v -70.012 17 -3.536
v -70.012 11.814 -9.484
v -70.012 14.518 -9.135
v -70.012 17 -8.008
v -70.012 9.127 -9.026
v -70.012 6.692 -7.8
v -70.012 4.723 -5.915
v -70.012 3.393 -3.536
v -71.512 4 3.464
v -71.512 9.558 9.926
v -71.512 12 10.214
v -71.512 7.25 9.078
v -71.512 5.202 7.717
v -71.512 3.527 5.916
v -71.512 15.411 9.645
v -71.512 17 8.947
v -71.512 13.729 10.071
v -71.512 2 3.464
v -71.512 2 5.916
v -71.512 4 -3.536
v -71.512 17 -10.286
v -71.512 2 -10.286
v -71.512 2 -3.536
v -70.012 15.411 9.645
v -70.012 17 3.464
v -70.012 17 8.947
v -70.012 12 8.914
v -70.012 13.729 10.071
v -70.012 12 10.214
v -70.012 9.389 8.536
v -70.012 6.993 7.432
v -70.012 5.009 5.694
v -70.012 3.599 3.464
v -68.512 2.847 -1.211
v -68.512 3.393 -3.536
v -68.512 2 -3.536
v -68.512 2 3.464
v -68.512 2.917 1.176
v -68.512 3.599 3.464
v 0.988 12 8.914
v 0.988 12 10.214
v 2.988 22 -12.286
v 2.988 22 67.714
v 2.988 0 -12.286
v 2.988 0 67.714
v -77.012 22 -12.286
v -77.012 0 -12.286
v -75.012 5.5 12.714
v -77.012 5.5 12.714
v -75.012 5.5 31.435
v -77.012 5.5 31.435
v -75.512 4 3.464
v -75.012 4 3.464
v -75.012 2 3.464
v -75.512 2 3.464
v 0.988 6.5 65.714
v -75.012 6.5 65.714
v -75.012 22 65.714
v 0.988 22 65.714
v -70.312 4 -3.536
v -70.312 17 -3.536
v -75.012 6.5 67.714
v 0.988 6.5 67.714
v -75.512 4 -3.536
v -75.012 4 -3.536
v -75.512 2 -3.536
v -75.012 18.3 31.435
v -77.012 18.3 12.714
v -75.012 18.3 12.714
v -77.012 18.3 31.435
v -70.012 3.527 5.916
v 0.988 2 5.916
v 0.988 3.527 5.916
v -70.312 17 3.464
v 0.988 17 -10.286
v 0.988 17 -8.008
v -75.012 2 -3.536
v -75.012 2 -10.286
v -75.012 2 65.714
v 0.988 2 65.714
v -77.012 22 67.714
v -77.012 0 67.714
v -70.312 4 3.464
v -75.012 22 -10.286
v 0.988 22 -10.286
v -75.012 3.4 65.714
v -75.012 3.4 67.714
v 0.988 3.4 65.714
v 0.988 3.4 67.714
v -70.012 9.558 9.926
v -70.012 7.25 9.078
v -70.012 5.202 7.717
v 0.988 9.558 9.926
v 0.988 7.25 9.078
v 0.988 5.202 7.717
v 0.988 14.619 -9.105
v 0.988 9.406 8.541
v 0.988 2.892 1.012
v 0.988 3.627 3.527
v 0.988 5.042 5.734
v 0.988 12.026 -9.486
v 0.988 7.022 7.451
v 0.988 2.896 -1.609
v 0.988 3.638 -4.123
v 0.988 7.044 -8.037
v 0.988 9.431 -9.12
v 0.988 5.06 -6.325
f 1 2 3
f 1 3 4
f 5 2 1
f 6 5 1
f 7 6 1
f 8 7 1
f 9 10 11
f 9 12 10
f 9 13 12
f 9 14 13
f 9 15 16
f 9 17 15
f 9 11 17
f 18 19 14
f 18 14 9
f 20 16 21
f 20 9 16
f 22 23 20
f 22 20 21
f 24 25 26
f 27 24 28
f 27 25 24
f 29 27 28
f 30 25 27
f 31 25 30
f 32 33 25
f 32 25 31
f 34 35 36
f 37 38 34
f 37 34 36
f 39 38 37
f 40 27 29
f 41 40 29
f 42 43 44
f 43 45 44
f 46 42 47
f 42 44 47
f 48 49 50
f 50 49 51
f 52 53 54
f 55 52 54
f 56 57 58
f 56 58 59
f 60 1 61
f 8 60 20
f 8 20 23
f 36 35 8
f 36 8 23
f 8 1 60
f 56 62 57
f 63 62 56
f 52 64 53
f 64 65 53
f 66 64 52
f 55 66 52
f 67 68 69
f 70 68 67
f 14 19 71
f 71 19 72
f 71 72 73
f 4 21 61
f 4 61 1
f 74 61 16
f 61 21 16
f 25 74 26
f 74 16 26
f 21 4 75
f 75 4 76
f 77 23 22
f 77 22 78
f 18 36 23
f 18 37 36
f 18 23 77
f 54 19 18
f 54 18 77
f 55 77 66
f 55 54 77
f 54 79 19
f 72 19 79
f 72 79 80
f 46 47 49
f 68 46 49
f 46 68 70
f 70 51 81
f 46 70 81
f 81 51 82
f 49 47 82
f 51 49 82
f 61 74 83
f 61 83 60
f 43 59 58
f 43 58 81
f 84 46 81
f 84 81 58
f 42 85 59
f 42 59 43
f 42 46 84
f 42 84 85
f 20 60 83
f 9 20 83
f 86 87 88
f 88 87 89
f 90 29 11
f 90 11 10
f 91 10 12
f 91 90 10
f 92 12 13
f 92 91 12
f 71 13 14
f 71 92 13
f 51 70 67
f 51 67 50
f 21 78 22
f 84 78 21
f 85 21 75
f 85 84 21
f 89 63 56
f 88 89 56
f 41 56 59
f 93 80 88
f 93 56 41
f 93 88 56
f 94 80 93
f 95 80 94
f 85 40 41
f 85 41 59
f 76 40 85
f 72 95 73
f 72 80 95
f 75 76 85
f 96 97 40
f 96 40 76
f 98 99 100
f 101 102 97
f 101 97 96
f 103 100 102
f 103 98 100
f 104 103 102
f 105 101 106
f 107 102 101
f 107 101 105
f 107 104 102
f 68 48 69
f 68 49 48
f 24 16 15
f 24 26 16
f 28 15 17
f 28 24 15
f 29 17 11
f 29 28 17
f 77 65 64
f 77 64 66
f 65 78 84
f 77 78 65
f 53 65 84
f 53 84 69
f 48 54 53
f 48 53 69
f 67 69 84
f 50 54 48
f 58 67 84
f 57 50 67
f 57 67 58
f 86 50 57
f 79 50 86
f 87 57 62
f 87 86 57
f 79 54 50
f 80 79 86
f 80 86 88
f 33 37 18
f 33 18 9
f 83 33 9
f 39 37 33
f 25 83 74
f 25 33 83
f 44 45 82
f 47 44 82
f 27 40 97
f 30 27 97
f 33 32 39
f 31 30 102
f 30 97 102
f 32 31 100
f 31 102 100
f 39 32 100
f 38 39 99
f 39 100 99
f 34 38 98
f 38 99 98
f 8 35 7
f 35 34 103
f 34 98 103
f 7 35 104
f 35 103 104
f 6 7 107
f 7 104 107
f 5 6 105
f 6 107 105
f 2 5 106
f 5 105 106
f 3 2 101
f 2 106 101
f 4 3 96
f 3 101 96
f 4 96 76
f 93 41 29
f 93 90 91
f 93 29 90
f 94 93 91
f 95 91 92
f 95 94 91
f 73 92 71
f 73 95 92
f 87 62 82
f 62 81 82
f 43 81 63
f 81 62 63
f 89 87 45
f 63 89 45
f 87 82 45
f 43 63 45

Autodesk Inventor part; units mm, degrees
ref_plane "YZ Plane" through (0, 0, 0) normal (1, 0, 0) x (0, 1, 0)
ref_plane "XZ Plane" through (0, 0, 0) normal (0, 1, 0) x (-1, 0, 0)
sketch "Sketch1" plane through (0, 0, 0) normal (0, 1, 0) x (-1, 0, 0)
  line L0 (77.0121, 67.7143) -> (-2.9879, 67.7143)
  line L1 (-2.9879, 67.7143) -> (-2.9879, -12.2857)
  line L2 (-2.9879, -12.2857) -> (77.0121, -12.2857)
  line L3 (77.0121, -12.2857) -> (77.0121, 67.7143)
  point P0 (0, 0)
  dimension "d0" = 80
  dimension "d1" = 80
extrude "Extrusion1" add sketch "Sketch1" along normal blind 2
sketch "Sketch2" plane through (0, 2, 0) normal (0, 1, 0) x (1, 0, 0)
  line L0 (2.9879, -67.7143) -> (2.9879, 12.2857) projected
  line L1 (2.9879, 12.2857) -> (-77.0121, 12.2857) projected
  line L2 (-77.0121, 12.2857) -> (-77.0121, -67.7143) projected
  line L3 (-77.0121, -67.7143) -> (2.9879, -67.7143) projected
  line L4 (0.9879, -65.7143) -> (0.9879, 10.2857)
  line L5 (0.9879, 10.2857) -> (-75.0121, 10.2857)
  line L6 (-75.0121, 10.2857) -> (-75.0121, -65.7143)
  line L7 (-75.0121, -65.7143) -> (0.9879, -65.7143)
  point P0 (0, 0)
  dimension "d4" = 2
extrude "Extrusion2" add sketch "Sketch2" along normal blind 20
sketch "Sketch4" plane through (-77.0121, 0, 67.7143) normal (0, 0, 1) x (1, 0, 0)
  line L0 (2, 2) -> (2, 22) projected
  line L1 (78, 2) -> (78, 22) projected
  line L2 (2, 12) -> (78, 12)
  line L3 (78, 12) -> (78, 2)
  line L4 (78, 2) -> (2, 2)
  line L5 (2, 2) -> (2, 12)
  line L6 (2, 2) -> (78, 2)
  line L7 (78, 2) -> (78, 7)
  line L8 (78, 7) -> (2, 7)
  line L9 (2, 7) -> (2, 2)
  line L10 (78, 2) -> (62, 2)
  line L11 (62, 2) -> (2, 2)
  line L12 (2, 2) -> (78, 2) projected
  line L13 (2, 2) -> (62, 2)
  line L14 (2, 3.4) -> (78, 3.4)
  line L15 (2, 6.5) -> (78, 6.5)
  point P0 (77.0121, 0)
  point P1 (2, 3.4)
  dimension "d53" = 16
  dimension "d54" = 1.4
  dimension "d55" = 0.5
extrude "Extrusion4" cut sketch "Sketch4" against normal blind 20 contours L0 L15 L1 L14
sketch "Sketch5" plane through (0.9879, 2, -10.2857) normal (-1, 0, 0) x (0, 0, 1)
  line L0 (76, 0) -> (0, 0) projected
  line L1 (0, 0) -> (0, 20) projected
  circle A0 centre (10, 10) radius 9
  circle A1 centre (10, 10) radius 10
  circle A2 centre (10, 10) radius 10.5
  circle A3 centre (10, 10) radius 9.2
  line L2 (0, 20) -> (76, 20) projected
  line L3 (0, 10) -> (20.5, 10)
  line L4 (13.2016, 0) -> (16.2016, 0)
  line L5 (16.2016, 0) -> (16.2016, 1.5271)
  line L6 (10, 10) -> (10, 20)
  point P0 (10.2857, -2)
  point P1 (78, 0)
  point P2 (10, 0)
  point P3 (13.2016, 0)
  point P4 (13.2016, 20)
  point P5 (6.7984, 20)
  point P6 (0, 13.2016)
  point P7 (0.8, 10)
  point P8 (0, 10)
  point P9 (19.2, 10)
  point P10 (6.7984, 0)
  point P11 (0, 6.7984)
  point P12 (10, 19.2)
  dimension "d11" = 18
  dimension "d12" = 1
  dimension "d13" = 0.5
  dimension "d14" = 0.2
  dimension "d31" = 3
extrude "Extrusion5" add sketch "Sketch5" along normal blind 71 contours L0 A2 L5 | L0 A1 L3 A2 | L0 A2 L1 A1 | A1 L3 A3 | L0 L1 A2 | L1 A2 L2 A1 | A1 L6 A3 L3 | L1 L2 A2 picked at (0.4271, 11.4241)
sketch "Sketch10" plane through (0, 2, 0) normal (0, 1, 0) x (1, 0, 0)
  line L0 (-70.0121, -2.9159) -> (-70.0121, -10.2143) projected
  line L1 (-70.0121, 10.2857) -> (-75.0121, 10.2857) projected
  line L2 (-70.0121, -10.2143) -> (-71.5121, -10.2143)
  line L3 (-71.5121, -10.2143) -> (-71.5121, 10.2857)
  line L4 (-71.5121, 10.2857) -> (-70.0121, 10.2857)
  line L5 (-70.0121, 10.2857) -> (-70.0121, -10.2143)
  point P0 (0, 0)
  point P1 (-70.0121, -5.9159)
  dimension "d21" = 1.5
extrude "Extrusion8" add sketch "Sketch10" along normal up to surface (20 mm away)
sketch "Sketch11" plane through (-71.5121, 2, -10.2857) normal (-1, 0, 0) x (0, 0, 1)
  line L0 (20.5, 0) -> (0, 0) projected
  line L1 (20.5, 0) -> (20.5, 20) projected
  line L2 (0, 0) -> (0, 20) projected
  line L3 (20.5, 0) -> (20.5, 20) projected
  line L4 (0, 15) -> (20.5, 15) projected
  line L5 (6.75, 2) -> (13.75, 2)
  line L6 (13.75, 2) -> (13.75, 0)
  line L7 (0, 0) -> (0, 20) projected
  line L8 (20.5, 0) -> (0, 0) projected
  line L9 (6.75, 2) -> (6.75, 0)
  line L10 (20.5, 20) -> (0, 20) projected
  point P0 (10.2857, -2)
  point P1 (10.25, 2)
  point P2 (10.25, 15)
  dimension "d25" = 2
  dimension "d26" = 7
extrude "Extrusion9" cut sketch "Sketch11" along normal blind 4 and the other way blind 3 contours L0 L9 L5 L6
sketch "Sketch14" plane through (-70.0121, 2, 10.2143) normal (1, 0, 0) x (0, 0, -1)
  arc A0 (0, 10) -> (4.2984, 1.5271) centre (10.5, 10) ccw projected
  line L0 (0, 0) -> (0, 10) projected
  line L1 (4.2984, 0) -> (0, 0) projected
  line L2 (4.2984, 0) -> (4.2984, 1.5271) projected
  point P0 (10.2143, -2)
extrude "Extrusion11" cut sketch "Sketch14" against normal up to surface (5 mm away)
sketch "Sketch15" plane through (-70.0121, 12, 10.2143) normal (1, 0, 0) x (0, 0, -1)
  line L0 (4.2984, -10) -> (4.2984, -8.4729) projected
  line L1 (4.2984, -10) -> (4.2984, 5)
  line L2 (13.75, -8) -> (6.75, -8)
  line L3 (6.75, -8) -> (6.75, 5)
  line L4 (6.75, 5) -> (13.75, 5)
  line L5 (13.75, 5) -> (13.75, -8)
  point P0 (10.2143, -12)
  dimension "d35" = 15
extrude "Extrusion12" cut sketch "Sketch15" against normal blind 0.3
sketch "Sketch16" plane through (-70.0121, 12, 10.2143) normal (1, 0, 0) x (0, 0, -1)
  arc A0 (13.75, -8.6068) -> (10.5, 9.2) centre (10.5, 0) ccw projected
  arc A1 (0, 0) -> (4.2984, -8.4729) centre (10.5, 0) ccw projected
  circle A2 centre (10.5, 0) radius 10.5
  line L0 (10.5, 10) -> (0, 10) projected
  line L1 (0, 0) -> (0, 10) projected
  point P0 (10.2143, -12)
  point P1 (0, 0)
  point P2 (7.2984, 10)
extrude "Extrusion13" cut sketch "Sketch16" against normal up to surface (5 mm away) contours L1 L0 A2
sketch "Sketch17" plane through (-77.0121, 0, -12.2857) normal (-1, 0, 0) x (0, 0, 1)
  line L0 (0, 0) -> (0, 22) projected
  line L1 (25.5, 18) -> (43, 18)
  line L2 (43, 18) -> (43, 5.5)
  line L3 (43, 5.5) -> (25.5, 5.5)
  line L4 (25.5, 5.5) -> (25.5, 18)
  line L5 (0, 22) -> (80, 22) projected
  line L6 (43, 18) -> (43.7211, 18)
  line L7 (43.7211, 18) -> (43.7211, 5.5)
  line L8 (43.7211, 5.5) -> (43, 5.5)
  line L9 (25.5, 18) -> (25, 18)
  line L10 (25, 18) -> (25, 5.5)
  line L11 (25, 5.5) -> (25.5, 5.5)
  line L12 (25, 18) -> (25, 18.3)
  line L13 (25, 18.3) -> (43.7211, 18.3)
  line L14 (43.7211, 18.3) -> (43.7211, 18)
  point P0 (12.2857, 0)
  point P1 (20.2416, 9.7558)
  point P2 (0, 11)
  dimension "d46" = 12.5
  dimension "d47" = 17.5
  dimension "d50" = 4
  dimension "d51" = 0.5
  dimension "d52" = 0.3
extrude "Extrusion14" cut sketch "Sketch17" against normal blind 4
sketch "Sketch18" plane through (0.9879, 6.5, 65.7143) normal (-1, 0, 0) x (0, 0, 1)
  arc A0 (-66, 14.7) -> (-56.8, 5.5) centre (-66, 5.5) ccw projected
  point P0 (-65.7143, -6.5)
ref_plane "Work Plane1" through (0.9879, 12, 10.2143) normal (0, 0, 1) x (1, 0, 0)
sketch "Sketch19" plane through (0.9879, 12, 10.2143) normal (0, 0, 1) x (1, 0, 0)
  line L0 (-71, -8.401) -> (-71, 5) projected
  line L1 (-74.2989, 5) -> (0, 5)
  line L2 (0, 5) -> (0, 10)
  line L3 (0, 10) -> (-74.2989, 10)
  line L4 (-74.2989, 10) -> (-74.2989, 5)
  point P0 (-0.9879, -12)
extrude "Extrusion15" cut sketch "Sketch19" against normal up to surface (20.5 mm away)
properties part number "obudowa2"
